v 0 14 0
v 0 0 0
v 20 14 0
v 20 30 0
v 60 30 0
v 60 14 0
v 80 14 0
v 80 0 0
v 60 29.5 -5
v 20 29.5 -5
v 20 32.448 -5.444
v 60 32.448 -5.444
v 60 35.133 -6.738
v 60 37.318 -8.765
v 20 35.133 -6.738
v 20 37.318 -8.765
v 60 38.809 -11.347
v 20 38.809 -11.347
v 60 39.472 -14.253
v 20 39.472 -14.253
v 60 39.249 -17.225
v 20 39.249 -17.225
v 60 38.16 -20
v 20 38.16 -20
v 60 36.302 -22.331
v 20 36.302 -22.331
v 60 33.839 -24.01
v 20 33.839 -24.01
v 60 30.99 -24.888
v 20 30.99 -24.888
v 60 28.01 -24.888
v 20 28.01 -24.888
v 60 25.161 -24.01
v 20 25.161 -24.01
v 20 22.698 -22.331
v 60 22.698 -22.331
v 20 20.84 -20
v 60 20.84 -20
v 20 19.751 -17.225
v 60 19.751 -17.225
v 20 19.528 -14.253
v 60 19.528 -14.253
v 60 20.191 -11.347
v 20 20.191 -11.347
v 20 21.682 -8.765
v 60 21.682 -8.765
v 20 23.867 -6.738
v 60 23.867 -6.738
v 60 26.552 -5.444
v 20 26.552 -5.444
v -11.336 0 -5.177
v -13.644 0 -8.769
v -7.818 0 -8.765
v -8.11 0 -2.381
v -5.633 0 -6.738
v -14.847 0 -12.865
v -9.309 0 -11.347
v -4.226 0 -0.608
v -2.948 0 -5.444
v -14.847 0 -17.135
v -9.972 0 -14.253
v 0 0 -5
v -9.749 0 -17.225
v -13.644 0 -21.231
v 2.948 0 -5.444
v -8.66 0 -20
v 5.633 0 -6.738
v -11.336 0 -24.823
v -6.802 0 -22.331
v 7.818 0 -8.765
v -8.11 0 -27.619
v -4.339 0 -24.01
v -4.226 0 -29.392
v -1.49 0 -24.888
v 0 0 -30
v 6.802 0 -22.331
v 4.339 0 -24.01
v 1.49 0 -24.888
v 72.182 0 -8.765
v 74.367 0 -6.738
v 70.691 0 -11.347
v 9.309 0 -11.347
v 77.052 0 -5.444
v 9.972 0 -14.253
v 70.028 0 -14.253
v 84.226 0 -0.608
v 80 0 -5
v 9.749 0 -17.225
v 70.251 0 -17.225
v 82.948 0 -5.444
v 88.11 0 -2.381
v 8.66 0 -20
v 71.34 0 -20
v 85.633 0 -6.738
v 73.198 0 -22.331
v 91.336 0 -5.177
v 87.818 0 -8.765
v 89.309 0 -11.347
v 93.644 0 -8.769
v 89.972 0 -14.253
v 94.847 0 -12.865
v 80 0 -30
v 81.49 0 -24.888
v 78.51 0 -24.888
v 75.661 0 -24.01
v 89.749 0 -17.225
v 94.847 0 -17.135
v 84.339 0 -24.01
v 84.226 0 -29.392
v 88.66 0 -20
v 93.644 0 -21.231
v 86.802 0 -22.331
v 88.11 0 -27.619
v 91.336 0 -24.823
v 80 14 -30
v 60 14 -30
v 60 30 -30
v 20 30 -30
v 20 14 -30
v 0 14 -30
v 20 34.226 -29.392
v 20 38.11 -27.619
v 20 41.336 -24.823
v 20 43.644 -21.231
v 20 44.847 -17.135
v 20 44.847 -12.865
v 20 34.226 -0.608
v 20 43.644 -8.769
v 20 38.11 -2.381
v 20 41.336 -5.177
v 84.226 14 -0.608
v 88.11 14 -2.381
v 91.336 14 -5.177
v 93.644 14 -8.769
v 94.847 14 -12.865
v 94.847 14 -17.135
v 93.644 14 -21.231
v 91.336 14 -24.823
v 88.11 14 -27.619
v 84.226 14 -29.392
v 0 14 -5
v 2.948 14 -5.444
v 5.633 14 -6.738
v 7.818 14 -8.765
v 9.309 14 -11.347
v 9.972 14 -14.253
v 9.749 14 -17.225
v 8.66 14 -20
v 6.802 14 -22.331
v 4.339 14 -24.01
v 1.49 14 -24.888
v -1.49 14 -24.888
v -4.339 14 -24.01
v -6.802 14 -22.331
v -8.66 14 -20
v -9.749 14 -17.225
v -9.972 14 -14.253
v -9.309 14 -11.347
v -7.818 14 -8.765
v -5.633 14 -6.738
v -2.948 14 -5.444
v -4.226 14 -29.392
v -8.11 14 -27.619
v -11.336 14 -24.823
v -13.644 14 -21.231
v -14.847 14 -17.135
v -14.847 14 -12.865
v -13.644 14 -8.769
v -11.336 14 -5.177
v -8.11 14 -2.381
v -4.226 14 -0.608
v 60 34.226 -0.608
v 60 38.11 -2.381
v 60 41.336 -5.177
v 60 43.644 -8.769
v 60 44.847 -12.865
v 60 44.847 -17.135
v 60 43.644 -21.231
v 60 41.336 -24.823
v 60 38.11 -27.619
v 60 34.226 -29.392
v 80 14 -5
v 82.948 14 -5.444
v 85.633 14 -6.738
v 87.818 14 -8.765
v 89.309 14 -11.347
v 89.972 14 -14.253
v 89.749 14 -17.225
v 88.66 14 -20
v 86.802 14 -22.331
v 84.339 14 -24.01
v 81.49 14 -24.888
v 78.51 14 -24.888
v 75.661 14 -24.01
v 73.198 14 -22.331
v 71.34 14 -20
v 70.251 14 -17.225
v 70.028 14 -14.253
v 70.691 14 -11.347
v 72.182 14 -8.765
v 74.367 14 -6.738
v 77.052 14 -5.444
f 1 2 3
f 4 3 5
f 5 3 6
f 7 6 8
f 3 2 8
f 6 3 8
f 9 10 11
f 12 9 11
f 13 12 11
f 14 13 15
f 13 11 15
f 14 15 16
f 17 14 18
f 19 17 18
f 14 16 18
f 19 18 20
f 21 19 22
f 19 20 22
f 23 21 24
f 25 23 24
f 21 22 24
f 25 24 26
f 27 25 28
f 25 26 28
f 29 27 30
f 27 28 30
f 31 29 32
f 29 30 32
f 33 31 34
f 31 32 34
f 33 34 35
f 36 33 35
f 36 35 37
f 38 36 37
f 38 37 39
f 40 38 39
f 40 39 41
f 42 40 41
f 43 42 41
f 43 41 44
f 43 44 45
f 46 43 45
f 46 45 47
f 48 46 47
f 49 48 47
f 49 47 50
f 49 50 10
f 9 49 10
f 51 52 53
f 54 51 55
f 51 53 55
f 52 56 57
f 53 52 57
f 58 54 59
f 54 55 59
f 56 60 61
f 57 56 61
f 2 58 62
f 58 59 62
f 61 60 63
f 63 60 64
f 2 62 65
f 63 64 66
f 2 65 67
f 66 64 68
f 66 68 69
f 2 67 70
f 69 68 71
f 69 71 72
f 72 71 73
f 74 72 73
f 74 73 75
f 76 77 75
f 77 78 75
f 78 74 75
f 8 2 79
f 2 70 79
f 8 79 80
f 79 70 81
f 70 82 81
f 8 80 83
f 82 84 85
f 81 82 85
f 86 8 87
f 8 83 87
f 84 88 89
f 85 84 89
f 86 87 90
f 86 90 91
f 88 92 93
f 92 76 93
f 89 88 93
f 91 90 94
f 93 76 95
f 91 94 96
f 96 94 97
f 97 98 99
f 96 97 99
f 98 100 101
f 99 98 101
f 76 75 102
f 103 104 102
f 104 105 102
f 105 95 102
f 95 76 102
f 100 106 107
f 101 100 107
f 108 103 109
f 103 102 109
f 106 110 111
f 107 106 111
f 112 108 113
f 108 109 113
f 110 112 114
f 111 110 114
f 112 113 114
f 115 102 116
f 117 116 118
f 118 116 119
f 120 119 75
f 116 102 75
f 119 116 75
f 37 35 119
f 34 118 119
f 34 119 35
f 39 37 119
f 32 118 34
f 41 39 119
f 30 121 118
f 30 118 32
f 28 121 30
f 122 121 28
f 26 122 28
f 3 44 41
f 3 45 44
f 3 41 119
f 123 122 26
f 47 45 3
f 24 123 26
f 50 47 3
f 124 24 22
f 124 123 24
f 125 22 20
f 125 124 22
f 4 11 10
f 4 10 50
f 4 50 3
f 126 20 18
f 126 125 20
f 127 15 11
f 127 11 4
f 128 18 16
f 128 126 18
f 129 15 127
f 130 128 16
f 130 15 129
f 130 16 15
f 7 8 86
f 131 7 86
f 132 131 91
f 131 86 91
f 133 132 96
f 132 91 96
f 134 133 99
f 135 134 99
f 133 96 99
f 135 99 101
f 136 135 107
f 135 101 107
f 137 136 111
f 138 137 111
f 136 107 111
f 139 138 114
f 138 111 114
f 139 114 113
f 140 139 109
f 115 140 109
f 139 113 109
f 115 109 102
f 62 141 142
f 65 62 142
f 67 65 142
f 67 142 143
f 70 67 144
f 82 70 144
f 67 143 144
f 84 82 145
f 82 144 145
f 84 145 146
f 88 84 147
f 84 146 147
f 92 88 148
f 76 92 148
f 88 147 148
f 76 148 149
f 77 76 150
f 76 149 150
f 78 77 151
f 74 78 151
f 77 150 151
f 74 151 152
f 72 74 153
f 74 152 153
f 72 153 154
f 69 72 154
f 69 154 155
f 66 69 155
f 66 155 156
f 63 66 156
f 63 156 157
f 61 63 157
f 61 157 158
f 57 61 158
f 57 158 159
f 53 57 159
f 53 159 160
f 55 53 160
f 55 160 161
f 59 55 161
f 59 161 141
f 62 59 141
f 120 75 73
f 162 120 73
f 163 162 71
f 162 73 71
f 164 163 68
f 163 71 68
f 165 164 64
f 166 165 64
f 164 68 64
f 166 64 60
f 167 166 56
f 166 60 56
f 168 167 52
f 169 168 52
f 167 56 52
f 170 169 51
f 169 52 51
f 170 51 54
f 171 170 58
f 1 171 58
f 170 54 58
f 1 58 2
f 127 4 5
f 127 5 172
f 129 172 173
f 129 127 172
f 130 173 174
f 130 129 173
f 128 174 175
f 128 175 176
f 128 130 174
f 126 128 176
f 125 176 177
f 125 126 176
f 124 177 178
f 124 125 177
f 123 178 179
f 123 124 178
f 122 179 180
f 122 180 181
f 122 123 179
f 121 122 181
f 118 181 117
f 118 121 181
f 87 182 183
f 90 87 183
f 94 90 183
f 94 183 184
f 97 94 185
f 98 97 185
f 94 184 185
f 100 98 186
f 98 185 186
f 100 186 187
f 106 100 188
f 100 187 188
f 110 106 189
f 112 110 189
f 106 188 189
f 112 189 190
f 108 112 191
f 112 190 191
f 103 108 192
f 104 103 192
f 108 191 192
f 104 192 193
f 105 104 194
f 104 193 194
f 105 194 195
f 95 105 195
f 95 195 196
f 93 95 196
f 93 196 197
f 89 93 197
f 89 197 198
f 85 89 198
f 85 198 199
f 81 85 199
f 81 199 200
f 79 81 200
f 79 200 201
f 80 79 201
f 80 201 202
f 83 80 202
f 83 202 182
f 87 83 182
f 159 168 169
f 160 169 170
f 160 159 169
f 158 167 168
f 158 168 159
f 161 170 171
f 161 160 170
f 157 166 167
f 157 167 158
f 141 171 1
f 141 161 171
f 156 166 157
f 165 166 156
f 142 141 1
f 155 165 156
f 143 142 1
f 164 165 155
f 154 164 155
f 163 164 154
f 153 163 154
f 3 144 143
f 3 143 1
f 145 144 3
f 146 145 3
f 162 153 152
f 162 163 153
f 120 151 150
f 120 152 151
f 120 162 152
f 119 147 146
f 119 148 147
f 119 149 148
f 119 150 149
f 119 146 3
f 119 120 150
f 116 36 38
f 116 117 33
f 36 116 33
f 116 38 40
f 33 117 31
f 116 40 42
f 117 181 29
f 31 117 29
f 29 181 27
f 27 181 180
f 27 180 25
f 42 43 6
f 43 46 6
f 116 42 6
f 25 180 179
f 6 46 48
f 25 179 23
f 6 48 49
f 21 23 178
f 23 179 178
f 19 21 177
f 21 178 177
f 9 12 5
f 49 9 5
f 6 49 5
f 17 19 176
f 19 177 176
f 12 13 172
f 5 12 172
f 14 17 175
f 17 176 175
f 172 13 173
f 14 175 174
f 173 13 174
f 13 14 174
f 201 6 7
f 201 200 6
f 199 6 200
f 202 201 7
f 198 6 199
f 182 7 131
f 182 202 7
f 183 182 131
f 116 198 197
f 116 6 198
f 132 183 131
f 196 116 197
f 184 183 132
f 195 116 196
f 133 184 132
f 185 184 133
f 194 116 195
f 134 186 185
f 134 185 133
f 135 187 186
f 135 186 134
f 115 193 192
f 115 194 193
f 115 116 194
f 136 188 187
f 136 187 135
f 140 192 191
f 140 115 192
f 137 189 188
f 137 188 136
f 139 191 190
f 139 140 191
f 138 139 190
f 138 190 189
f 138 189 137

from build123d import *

# Parameters (mm, degrees)
SALIENTE_EXTRUIR1_DEPTH = 14
CROQUIS2_W              = 40
CROQUIS2_H              = 30
SALIENTE_EXTRUIR2_DEPTH = 16
CROQUIS3_R              = 15
SALIENTE_EXTRUIR4_DEPTH = 40
CROQUIS6_R              = 10
CORTAR_EXTRUIR1_DEPTH   = 96
CROQUIS8_R              = 10
CORTAR_EXTRUIR2_DEPTH   = 96
CROQUIS11_R             = 10
CORTAR_EXTRUIR3_DEPTH   = 96


with BuildPart() as part:
    # Croquis1 → Saliente-Extruir1 (new body)
    with BuildSketch(Plane(origin=(0, 0, 0), x_dir=(1, 0, 0), z_dir=(0, 1, 0))):
        with BuildLine():
            Line((0, 0), (80, 0))
            ThreePointArc((80, 0), (95, 15), (80, 30))
            Line((80, 30), (0, 30))
            ThreePointArc((0, 30), (-15, 15), (0, 0))
        make_face()
    extrude(amount=SALIENTE_EXTRUIR1_DEPTH)

    # Croquis2 → Saliente-Extruir2 (add)
    with BuildSketch(Plane(origin=(0, 14, 0), x_dir=(1, 0, 0), z_dir=(0, 1, 0))):
        with Locations((40, 15)):
            Rectangle(CROQUIS2_W, CROQUIS2_H)
    extrude(amount=SALIENTE_EXTRUIR2_DEPTH)

    # Croquis3 → Saliente-Extruir4 (add)
    with BuildSketch(Plane.ZY.offset(-20)):
        with Locations((-15, 30)):
            Circle(CROQUIS3_R)
    extrude(amount=-SALIENTE_EXTRUIR4_DEPTH)

    # Croquis6 → Cortar-Extruir1 (cut)
    with BuildSketch(Plane.ZY.offset(-20)):
        with Locations((-15, 29.5)):
            Circle(CROQUIS6_R)
    extrude(amount=-CORTAR_EXTRUIR1_DEPTH, mode=Mode.SUBTRACT)

    # Croquis8 → Cortar-Extruir2 (cut)
    with BuildSketch(Plane(origin=(0, 14, 0), x_dir=(1, 0, 0), z_dir=(0, 1, 0))):
        with Locations(Location((0, 15, 0), (0, 0, 270))):
            Circle(CROQUIS8_R)
    extrude(amount=-CORTAR_EXTRUIR2_DEPTH, mode=Mode.SUBTRACT)

    # Croquis11 → Cortar-Extruir3 (cut)
    with BuildSketch(Plane(origin=(0, 14, 0), x_dir=(1, 0, 0), z_dir=(0, 1, 0))):
        with Locations(Location((80, 15, 0), (0, 0, 270))):
            Circle(CROQUIS11_R)
    extrude(amount=-CORTAR_EXTRUIR3_DEPTH, mode=Mode.SUBTRACT)


solid = part.part
